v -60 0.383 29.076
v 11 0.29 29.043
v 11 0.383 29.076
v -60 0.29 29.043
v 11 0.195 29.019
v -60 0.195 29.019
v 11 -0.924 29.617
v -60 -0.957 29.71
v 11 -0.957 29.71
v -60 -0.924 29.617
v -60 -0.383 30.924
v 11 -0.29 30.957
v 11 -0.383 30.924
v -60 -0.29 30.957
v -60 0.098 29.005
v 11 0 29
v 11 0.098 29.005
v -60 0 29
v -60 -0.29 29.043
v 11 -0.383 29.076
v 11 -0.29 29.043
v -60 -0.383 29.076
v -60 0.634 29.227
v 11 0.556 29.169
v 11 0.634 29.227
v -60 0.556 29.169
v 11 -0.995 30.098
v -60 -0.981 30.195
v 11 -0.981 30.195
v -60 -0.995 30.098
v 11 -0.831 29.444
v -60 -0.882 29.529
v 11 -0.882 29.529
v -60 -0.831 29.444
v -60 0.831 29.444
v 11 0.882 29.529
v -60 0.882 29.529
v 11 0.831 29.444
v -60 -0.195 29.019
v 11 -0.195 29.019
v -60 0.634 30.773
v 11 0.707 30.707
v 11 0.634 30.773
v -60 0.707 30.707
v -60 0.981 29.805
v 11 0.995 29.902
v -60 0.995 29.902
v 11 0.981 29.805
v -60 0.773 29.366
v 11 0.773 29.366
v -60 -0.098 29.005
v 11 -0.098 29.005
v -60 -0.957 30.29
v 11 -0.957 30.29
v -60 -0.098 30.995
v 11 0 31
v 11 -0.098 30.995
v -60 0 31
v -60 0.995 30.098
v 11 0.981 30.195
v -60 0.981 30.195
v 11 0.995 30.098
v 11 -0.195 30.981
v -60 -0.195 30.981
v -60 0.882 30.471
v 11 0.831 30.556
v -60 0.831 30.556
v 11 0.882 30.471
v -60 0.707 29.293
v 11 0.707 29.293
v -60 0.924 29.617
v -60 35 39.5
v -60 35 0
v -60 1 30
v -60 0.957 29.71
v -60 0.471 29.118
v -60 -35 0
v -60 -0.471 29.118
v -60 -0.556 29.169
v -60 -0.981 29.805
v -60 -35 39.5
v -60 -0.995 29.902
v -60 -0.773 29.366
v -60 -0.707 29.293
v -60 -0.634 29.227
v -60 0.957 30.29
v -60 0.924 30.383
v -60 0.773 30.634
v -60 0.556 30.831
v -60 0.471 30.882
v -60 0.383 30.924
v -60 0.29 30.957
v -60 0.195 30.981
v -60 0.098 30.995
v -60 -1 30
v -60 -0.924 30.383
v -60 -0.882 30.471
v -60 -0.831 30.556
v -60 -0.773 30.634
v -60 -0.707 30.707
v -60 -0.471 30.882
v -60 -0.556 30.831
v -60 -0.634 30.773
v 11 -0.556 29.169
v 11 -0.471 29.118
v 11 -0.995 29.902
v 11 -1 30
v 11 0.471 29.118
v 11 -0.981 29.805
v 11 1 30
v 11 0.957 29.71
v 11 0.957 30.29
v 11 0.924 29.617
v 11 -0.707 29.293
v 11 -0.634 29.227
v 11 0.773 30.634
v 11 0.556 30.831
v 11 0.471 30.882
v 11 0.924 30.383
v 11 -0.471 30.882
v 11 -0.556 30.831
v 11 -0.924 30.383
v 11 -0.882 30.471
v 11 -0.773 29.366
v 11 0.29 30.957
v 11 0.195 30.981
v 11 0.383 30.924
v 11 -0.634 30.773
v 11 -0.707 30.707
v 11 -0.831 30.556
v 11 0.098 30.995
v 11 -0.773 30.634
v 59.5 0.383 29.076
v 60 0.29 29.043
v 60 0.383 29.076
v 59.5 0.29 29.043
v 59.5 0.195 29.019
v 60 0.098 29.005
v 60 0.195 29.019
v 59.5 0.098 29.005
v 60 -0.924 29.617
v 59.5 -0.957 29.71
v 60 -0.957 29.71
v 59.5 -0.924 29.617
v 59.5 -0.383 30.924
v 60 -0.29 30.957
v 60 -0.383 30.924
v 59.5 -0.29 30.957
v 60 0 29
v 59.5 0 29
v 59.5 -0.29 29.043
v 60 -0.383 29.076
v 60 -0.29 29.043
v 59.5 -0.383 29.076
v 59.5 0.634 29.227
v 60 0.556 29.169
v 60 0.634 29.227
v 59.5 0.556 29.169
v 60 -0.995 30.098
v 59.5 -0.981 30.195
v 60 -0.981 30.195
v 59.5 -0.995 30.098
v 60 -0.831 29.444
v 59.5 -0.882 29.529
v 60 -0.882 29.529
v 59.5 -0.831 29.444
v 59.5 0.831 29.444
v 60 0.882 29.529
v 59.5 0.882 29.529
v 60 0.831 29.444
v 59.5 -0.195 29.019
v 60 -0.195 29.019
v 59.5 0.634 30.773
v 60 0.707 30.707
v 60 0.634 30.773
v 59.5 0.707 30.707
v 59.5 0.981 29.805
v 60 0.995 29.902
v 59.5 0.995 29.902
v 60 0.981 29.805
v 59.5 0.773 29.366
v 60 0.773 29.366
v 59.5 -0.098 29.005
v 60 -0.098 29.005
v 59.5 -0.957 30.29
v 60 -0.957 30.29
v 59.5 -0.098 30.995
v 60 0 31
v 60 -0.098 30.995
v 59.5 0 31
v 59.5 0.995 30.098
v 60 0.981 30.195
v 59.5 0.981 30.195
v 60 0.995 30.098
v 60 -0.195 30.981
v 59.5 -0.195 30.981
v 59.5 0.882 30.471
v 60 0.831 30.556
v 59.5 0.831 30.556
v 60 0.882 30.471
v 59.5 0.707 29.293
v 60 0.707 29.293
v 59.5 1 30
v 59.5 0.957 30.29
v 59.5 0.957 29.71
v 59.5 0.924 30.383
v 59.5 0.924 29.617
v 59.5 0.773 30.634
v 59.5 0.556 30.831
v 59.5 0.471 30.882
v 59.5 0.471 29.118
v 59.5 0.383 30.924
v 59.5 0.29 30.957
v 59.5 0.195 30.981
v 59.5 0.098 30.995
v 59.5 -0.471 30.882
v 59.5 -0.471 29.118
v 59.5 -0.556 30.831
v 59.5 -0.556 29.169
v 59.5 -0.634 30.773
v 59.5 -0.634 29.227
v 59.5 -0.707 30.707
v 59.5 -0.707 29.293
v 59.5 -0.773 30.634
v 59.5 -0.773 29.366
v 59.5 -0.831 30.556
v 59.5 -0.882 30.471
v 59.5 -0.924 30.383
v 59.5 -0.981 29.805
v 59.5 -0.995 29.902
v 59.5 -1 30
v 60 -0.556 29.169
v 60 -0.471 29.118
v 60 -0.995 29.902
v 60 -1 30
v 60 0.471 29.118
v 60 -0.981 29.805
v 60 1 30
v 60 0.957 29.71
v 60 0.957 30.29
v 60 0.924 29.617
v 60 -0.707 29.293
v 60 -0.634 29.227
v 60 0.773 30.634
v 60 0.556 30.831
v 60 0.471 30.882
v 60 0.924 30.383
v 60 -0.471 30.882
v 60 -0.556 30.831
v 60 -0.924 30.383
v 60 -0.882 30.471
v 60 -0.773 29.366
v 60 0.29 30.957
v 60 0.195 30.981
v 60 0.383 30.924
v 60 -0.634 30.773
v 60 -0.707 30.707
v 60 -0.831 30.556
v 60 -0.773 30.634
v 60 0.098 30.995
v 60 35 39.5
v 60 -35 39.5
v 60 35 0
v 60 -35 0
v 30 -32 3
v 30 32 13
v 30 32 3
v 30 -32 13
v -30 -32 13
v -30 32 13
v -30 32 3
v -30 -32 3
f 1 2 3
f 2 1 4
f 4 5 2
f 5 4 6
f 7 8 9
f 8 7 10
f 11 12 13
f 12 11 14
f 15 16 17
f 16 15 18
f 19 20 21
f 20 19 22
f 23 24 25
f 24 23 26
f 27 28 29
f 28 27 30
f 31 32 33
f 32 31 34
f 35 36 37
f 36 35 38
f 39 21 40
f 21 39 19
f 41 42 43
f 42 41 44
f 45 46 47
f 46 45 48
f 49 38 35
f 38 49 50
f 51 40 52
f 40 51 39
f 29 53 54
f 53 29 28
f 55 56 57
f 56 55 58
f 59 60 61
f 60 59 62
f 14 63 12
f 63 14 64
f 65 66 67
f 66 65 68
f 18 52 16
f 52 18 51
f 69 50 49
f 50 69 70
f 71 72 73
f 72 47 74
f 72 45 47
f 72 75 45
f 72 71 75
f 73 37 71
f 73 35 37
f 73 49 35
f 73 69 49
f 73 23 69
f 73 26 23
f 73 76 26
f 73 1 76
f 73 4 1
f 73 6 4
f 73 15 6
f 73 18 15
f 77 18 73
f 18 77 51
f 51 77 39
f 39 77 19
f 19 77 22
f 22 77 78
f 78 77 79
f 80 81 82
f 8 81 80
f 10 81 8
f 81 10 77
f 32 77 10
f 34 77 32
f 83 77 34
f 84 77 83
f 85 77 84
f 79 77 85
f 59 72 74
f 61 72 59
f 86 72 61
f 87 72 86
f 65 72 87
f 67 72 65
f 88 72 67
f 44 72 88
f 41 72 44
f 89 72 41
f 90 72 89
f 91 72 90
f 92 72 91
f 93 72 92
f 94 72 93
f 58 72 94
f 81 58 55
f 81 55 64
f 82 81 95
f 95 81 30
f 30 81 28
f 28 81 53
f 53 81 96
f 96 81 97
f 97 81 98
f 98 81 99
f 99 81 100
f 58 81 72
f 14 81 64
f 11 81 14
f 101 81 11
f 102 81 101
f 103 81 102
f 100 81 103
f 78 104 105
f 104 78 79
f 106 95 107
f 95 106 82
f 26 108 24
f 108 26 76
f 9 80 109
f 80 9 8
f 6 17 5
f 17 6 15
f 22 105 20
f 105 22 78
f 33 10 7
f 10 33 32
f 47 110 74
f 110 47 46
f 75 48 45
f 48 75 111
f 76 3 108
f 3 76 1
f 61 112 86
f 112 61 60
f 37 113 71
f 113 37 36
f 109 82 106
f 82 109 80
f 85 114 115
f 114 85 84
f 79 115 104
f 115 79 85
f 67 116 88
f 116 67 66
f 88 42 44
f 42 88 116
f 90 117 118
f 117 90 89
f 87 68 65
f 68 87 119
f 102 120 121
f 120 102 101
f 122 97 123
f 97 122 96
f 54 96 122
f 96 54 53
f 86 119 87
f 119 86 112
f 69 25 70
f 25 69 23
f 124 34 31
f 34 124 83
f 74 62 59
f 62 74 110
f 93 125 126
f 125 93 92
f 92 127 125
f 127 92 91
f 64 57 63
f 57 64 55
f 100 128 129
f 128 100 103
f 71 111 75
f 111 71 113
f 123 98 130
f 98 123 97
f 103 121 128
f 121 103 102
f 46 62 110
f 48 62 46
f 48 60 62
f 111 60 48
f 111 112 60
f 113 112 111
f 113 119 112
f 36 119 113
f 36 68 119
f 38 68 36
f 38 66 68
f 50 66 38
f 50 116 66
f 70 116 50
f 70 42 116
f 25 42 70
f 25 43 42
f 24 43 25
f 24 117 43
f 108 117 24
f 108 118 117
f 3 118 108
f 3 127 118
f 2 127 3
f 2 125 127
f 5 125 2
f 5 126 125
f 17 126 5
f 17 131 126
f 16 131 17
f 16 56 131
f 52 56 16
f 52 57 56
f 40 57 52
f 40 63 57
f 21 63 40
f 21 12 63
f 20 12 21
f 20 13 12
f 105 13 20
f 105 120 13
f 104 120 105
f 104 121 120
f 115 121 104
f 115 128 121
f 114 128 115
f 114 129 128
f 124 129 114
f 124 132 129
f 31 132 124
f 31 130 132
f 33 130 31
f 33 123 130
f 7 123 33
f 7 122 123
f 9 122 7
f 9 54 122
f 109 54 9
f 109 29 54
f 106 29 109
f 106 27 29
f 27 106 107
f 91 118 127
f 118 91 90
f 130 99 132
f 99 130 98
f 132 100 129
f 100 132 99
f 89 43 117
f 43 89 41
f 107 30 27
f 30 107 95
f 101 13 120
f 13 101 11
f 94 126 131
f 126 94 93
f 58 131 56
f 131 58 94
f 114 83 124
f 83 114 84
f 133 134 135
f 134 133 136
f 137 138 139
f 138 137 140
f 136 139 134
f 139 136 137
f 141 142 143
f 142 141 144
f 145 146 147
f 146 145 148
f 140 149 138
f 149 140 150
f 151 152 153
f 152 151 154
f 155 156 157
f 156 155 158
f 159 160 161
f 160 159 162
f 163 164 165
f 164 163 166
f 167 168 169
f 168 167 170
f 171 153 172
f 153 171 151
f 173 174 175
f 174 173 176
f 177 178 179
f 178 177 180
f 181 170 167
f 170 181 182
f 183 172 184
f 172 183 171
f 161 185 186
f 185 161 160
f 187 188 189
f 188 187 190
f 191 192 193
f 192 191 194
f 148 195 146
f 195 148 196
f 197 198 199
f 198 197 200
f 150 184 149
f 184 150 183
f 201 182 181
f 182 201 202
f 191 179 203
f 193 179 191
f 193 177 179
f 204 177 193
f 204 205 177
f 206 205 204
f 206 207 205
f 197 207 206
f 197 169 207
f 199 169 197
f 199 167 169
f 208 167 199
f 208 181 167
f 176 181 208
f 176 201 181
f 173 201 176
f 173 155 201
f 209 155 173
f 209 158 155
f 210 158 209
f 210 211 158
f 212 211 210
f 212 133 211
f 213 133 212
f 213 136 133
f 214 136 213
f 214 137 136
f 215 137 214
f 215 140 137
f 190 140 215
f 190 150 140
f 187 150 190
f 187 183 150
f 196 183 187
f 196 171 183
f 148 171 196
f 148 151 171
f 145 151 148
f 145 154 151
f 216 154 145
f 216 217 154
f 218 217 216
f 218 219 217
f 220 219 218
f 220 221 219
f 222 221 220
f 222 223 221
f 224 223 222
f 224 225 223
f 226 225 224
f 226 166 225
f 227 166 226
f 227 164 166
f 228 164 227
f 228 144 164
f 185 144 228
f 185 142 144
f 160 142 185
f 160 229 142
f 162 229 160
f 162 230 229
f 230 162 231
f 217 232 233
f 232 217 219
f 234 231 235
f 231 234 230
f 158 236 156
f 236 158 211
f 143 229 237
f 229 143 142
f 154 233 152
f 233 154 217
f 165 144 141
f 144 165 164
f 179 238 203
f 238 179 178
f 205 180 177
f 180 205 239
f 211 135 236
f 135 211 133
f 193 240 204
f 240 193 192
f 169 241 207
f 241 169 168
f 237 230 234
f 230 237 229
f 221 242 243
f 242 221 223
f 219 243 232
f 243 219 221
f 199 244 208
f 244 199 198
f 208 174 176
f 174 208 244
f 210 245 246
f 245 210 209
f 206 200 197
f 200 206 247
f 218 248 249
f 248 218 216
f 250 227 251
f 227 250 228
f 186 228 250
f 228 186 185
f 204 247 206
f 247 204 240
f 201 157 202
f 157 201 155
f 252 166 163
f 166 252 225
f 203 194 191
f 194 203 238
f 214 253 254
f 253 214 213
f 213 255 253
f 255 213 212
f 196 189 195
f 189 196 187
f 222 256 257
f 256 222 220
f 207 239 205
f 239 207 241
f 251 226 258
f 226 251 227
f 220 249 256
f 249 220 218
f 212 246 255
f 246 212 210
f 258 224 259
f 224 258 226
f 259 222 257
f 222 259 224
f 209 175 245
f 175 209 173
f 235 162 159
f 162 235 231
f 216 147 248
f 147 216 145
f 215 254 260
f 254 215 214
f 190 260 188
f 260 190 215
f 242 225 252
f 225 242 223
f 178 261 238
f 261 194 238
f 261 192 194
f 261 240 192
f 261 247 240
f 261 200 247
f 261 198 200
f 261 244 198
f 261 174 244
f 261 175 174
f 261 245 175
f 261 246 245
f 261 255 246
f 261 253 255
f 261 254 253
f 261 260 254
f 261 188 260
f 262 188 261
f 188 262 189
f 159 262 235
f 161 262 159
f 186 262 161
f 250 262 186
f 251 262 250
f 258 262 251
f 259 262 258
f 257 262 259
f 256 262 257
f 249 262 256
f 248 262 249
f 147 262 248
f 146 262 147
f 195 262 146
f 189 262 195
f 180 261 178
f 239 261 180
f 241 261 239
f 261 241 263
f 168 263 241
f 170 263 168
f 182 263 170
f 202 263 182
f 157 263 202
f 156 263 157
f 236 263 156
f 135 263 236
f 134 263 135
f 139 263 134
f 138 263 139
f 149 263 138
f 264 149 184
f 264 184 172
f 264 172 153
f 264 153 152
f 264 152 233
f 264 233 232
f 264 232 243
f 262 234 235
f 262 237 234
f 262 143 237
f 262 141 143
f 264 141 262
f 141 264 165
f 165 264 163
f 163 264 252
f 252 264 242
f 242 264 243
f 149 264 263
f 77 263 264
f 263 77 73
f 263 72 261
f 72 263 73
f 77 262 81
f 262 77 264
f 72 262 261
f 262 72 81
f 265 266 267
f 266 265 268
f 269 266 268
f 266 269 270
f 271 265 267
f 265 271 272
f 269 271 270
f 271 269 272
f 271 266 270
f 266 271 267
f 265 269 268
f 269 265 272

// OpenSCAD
// Mini horizontal gel-electrophoresis box - buffer tank
// Print orientation: tank rests on XY plane, open top facing +Z

$fn = 64;

// ---- Tank ----
tank_x = 120;      // outer length (X)
tank_y = 70;       // outer width (Y)
tank_z = 40;       // outer height (Z)
wall   = 3;        // wall thickness
floor  = 3;        // floor thickness

// ---- Platform ----
plat_x = 60;       // platform length in X
plat_y = tank_y - 2*wall;  // platform spans full inner width
plat_top = 13;     // platform top height above tank bottom (z)

// ---- Electrode holes ----
hole_d = 2;        // horizontal hole diameter
hole_y = 0;        // hole Y position
hole_z = 30;       // hole Z position

// ---- Misc ----
eps = 0.5;         // cutter overshoot past faces

difference() {
    // Tank body
    translate([-tank_x/2, -tank_y/2, 0])
        cube([tank_x, tank_y, tank_z]);

    // Open top
    translate([-tank_x/2, -tank_y/2, tank_z - eps])
        cube([tank_x, tank_y, eps]);

    // Raised platform (solid, divides bottom into two chambers)
    translate([-tank_x/2 + (tank_x - plat_x)/2, -plat_y/2, floor])
        cube([plat_x, plat_y, plat_top - floor]);

    // Horizontal electrode holes through each end wall (along X)
    for (sx = [-1, 1])
        translate([sx > 0 ? tank_x/2 - eps : -tank_x/2, hole_y, hole_z])
            rotate([0, 90, 0])
                cylinder(d = hole_d, h = tank_y + 2*eps);
}
